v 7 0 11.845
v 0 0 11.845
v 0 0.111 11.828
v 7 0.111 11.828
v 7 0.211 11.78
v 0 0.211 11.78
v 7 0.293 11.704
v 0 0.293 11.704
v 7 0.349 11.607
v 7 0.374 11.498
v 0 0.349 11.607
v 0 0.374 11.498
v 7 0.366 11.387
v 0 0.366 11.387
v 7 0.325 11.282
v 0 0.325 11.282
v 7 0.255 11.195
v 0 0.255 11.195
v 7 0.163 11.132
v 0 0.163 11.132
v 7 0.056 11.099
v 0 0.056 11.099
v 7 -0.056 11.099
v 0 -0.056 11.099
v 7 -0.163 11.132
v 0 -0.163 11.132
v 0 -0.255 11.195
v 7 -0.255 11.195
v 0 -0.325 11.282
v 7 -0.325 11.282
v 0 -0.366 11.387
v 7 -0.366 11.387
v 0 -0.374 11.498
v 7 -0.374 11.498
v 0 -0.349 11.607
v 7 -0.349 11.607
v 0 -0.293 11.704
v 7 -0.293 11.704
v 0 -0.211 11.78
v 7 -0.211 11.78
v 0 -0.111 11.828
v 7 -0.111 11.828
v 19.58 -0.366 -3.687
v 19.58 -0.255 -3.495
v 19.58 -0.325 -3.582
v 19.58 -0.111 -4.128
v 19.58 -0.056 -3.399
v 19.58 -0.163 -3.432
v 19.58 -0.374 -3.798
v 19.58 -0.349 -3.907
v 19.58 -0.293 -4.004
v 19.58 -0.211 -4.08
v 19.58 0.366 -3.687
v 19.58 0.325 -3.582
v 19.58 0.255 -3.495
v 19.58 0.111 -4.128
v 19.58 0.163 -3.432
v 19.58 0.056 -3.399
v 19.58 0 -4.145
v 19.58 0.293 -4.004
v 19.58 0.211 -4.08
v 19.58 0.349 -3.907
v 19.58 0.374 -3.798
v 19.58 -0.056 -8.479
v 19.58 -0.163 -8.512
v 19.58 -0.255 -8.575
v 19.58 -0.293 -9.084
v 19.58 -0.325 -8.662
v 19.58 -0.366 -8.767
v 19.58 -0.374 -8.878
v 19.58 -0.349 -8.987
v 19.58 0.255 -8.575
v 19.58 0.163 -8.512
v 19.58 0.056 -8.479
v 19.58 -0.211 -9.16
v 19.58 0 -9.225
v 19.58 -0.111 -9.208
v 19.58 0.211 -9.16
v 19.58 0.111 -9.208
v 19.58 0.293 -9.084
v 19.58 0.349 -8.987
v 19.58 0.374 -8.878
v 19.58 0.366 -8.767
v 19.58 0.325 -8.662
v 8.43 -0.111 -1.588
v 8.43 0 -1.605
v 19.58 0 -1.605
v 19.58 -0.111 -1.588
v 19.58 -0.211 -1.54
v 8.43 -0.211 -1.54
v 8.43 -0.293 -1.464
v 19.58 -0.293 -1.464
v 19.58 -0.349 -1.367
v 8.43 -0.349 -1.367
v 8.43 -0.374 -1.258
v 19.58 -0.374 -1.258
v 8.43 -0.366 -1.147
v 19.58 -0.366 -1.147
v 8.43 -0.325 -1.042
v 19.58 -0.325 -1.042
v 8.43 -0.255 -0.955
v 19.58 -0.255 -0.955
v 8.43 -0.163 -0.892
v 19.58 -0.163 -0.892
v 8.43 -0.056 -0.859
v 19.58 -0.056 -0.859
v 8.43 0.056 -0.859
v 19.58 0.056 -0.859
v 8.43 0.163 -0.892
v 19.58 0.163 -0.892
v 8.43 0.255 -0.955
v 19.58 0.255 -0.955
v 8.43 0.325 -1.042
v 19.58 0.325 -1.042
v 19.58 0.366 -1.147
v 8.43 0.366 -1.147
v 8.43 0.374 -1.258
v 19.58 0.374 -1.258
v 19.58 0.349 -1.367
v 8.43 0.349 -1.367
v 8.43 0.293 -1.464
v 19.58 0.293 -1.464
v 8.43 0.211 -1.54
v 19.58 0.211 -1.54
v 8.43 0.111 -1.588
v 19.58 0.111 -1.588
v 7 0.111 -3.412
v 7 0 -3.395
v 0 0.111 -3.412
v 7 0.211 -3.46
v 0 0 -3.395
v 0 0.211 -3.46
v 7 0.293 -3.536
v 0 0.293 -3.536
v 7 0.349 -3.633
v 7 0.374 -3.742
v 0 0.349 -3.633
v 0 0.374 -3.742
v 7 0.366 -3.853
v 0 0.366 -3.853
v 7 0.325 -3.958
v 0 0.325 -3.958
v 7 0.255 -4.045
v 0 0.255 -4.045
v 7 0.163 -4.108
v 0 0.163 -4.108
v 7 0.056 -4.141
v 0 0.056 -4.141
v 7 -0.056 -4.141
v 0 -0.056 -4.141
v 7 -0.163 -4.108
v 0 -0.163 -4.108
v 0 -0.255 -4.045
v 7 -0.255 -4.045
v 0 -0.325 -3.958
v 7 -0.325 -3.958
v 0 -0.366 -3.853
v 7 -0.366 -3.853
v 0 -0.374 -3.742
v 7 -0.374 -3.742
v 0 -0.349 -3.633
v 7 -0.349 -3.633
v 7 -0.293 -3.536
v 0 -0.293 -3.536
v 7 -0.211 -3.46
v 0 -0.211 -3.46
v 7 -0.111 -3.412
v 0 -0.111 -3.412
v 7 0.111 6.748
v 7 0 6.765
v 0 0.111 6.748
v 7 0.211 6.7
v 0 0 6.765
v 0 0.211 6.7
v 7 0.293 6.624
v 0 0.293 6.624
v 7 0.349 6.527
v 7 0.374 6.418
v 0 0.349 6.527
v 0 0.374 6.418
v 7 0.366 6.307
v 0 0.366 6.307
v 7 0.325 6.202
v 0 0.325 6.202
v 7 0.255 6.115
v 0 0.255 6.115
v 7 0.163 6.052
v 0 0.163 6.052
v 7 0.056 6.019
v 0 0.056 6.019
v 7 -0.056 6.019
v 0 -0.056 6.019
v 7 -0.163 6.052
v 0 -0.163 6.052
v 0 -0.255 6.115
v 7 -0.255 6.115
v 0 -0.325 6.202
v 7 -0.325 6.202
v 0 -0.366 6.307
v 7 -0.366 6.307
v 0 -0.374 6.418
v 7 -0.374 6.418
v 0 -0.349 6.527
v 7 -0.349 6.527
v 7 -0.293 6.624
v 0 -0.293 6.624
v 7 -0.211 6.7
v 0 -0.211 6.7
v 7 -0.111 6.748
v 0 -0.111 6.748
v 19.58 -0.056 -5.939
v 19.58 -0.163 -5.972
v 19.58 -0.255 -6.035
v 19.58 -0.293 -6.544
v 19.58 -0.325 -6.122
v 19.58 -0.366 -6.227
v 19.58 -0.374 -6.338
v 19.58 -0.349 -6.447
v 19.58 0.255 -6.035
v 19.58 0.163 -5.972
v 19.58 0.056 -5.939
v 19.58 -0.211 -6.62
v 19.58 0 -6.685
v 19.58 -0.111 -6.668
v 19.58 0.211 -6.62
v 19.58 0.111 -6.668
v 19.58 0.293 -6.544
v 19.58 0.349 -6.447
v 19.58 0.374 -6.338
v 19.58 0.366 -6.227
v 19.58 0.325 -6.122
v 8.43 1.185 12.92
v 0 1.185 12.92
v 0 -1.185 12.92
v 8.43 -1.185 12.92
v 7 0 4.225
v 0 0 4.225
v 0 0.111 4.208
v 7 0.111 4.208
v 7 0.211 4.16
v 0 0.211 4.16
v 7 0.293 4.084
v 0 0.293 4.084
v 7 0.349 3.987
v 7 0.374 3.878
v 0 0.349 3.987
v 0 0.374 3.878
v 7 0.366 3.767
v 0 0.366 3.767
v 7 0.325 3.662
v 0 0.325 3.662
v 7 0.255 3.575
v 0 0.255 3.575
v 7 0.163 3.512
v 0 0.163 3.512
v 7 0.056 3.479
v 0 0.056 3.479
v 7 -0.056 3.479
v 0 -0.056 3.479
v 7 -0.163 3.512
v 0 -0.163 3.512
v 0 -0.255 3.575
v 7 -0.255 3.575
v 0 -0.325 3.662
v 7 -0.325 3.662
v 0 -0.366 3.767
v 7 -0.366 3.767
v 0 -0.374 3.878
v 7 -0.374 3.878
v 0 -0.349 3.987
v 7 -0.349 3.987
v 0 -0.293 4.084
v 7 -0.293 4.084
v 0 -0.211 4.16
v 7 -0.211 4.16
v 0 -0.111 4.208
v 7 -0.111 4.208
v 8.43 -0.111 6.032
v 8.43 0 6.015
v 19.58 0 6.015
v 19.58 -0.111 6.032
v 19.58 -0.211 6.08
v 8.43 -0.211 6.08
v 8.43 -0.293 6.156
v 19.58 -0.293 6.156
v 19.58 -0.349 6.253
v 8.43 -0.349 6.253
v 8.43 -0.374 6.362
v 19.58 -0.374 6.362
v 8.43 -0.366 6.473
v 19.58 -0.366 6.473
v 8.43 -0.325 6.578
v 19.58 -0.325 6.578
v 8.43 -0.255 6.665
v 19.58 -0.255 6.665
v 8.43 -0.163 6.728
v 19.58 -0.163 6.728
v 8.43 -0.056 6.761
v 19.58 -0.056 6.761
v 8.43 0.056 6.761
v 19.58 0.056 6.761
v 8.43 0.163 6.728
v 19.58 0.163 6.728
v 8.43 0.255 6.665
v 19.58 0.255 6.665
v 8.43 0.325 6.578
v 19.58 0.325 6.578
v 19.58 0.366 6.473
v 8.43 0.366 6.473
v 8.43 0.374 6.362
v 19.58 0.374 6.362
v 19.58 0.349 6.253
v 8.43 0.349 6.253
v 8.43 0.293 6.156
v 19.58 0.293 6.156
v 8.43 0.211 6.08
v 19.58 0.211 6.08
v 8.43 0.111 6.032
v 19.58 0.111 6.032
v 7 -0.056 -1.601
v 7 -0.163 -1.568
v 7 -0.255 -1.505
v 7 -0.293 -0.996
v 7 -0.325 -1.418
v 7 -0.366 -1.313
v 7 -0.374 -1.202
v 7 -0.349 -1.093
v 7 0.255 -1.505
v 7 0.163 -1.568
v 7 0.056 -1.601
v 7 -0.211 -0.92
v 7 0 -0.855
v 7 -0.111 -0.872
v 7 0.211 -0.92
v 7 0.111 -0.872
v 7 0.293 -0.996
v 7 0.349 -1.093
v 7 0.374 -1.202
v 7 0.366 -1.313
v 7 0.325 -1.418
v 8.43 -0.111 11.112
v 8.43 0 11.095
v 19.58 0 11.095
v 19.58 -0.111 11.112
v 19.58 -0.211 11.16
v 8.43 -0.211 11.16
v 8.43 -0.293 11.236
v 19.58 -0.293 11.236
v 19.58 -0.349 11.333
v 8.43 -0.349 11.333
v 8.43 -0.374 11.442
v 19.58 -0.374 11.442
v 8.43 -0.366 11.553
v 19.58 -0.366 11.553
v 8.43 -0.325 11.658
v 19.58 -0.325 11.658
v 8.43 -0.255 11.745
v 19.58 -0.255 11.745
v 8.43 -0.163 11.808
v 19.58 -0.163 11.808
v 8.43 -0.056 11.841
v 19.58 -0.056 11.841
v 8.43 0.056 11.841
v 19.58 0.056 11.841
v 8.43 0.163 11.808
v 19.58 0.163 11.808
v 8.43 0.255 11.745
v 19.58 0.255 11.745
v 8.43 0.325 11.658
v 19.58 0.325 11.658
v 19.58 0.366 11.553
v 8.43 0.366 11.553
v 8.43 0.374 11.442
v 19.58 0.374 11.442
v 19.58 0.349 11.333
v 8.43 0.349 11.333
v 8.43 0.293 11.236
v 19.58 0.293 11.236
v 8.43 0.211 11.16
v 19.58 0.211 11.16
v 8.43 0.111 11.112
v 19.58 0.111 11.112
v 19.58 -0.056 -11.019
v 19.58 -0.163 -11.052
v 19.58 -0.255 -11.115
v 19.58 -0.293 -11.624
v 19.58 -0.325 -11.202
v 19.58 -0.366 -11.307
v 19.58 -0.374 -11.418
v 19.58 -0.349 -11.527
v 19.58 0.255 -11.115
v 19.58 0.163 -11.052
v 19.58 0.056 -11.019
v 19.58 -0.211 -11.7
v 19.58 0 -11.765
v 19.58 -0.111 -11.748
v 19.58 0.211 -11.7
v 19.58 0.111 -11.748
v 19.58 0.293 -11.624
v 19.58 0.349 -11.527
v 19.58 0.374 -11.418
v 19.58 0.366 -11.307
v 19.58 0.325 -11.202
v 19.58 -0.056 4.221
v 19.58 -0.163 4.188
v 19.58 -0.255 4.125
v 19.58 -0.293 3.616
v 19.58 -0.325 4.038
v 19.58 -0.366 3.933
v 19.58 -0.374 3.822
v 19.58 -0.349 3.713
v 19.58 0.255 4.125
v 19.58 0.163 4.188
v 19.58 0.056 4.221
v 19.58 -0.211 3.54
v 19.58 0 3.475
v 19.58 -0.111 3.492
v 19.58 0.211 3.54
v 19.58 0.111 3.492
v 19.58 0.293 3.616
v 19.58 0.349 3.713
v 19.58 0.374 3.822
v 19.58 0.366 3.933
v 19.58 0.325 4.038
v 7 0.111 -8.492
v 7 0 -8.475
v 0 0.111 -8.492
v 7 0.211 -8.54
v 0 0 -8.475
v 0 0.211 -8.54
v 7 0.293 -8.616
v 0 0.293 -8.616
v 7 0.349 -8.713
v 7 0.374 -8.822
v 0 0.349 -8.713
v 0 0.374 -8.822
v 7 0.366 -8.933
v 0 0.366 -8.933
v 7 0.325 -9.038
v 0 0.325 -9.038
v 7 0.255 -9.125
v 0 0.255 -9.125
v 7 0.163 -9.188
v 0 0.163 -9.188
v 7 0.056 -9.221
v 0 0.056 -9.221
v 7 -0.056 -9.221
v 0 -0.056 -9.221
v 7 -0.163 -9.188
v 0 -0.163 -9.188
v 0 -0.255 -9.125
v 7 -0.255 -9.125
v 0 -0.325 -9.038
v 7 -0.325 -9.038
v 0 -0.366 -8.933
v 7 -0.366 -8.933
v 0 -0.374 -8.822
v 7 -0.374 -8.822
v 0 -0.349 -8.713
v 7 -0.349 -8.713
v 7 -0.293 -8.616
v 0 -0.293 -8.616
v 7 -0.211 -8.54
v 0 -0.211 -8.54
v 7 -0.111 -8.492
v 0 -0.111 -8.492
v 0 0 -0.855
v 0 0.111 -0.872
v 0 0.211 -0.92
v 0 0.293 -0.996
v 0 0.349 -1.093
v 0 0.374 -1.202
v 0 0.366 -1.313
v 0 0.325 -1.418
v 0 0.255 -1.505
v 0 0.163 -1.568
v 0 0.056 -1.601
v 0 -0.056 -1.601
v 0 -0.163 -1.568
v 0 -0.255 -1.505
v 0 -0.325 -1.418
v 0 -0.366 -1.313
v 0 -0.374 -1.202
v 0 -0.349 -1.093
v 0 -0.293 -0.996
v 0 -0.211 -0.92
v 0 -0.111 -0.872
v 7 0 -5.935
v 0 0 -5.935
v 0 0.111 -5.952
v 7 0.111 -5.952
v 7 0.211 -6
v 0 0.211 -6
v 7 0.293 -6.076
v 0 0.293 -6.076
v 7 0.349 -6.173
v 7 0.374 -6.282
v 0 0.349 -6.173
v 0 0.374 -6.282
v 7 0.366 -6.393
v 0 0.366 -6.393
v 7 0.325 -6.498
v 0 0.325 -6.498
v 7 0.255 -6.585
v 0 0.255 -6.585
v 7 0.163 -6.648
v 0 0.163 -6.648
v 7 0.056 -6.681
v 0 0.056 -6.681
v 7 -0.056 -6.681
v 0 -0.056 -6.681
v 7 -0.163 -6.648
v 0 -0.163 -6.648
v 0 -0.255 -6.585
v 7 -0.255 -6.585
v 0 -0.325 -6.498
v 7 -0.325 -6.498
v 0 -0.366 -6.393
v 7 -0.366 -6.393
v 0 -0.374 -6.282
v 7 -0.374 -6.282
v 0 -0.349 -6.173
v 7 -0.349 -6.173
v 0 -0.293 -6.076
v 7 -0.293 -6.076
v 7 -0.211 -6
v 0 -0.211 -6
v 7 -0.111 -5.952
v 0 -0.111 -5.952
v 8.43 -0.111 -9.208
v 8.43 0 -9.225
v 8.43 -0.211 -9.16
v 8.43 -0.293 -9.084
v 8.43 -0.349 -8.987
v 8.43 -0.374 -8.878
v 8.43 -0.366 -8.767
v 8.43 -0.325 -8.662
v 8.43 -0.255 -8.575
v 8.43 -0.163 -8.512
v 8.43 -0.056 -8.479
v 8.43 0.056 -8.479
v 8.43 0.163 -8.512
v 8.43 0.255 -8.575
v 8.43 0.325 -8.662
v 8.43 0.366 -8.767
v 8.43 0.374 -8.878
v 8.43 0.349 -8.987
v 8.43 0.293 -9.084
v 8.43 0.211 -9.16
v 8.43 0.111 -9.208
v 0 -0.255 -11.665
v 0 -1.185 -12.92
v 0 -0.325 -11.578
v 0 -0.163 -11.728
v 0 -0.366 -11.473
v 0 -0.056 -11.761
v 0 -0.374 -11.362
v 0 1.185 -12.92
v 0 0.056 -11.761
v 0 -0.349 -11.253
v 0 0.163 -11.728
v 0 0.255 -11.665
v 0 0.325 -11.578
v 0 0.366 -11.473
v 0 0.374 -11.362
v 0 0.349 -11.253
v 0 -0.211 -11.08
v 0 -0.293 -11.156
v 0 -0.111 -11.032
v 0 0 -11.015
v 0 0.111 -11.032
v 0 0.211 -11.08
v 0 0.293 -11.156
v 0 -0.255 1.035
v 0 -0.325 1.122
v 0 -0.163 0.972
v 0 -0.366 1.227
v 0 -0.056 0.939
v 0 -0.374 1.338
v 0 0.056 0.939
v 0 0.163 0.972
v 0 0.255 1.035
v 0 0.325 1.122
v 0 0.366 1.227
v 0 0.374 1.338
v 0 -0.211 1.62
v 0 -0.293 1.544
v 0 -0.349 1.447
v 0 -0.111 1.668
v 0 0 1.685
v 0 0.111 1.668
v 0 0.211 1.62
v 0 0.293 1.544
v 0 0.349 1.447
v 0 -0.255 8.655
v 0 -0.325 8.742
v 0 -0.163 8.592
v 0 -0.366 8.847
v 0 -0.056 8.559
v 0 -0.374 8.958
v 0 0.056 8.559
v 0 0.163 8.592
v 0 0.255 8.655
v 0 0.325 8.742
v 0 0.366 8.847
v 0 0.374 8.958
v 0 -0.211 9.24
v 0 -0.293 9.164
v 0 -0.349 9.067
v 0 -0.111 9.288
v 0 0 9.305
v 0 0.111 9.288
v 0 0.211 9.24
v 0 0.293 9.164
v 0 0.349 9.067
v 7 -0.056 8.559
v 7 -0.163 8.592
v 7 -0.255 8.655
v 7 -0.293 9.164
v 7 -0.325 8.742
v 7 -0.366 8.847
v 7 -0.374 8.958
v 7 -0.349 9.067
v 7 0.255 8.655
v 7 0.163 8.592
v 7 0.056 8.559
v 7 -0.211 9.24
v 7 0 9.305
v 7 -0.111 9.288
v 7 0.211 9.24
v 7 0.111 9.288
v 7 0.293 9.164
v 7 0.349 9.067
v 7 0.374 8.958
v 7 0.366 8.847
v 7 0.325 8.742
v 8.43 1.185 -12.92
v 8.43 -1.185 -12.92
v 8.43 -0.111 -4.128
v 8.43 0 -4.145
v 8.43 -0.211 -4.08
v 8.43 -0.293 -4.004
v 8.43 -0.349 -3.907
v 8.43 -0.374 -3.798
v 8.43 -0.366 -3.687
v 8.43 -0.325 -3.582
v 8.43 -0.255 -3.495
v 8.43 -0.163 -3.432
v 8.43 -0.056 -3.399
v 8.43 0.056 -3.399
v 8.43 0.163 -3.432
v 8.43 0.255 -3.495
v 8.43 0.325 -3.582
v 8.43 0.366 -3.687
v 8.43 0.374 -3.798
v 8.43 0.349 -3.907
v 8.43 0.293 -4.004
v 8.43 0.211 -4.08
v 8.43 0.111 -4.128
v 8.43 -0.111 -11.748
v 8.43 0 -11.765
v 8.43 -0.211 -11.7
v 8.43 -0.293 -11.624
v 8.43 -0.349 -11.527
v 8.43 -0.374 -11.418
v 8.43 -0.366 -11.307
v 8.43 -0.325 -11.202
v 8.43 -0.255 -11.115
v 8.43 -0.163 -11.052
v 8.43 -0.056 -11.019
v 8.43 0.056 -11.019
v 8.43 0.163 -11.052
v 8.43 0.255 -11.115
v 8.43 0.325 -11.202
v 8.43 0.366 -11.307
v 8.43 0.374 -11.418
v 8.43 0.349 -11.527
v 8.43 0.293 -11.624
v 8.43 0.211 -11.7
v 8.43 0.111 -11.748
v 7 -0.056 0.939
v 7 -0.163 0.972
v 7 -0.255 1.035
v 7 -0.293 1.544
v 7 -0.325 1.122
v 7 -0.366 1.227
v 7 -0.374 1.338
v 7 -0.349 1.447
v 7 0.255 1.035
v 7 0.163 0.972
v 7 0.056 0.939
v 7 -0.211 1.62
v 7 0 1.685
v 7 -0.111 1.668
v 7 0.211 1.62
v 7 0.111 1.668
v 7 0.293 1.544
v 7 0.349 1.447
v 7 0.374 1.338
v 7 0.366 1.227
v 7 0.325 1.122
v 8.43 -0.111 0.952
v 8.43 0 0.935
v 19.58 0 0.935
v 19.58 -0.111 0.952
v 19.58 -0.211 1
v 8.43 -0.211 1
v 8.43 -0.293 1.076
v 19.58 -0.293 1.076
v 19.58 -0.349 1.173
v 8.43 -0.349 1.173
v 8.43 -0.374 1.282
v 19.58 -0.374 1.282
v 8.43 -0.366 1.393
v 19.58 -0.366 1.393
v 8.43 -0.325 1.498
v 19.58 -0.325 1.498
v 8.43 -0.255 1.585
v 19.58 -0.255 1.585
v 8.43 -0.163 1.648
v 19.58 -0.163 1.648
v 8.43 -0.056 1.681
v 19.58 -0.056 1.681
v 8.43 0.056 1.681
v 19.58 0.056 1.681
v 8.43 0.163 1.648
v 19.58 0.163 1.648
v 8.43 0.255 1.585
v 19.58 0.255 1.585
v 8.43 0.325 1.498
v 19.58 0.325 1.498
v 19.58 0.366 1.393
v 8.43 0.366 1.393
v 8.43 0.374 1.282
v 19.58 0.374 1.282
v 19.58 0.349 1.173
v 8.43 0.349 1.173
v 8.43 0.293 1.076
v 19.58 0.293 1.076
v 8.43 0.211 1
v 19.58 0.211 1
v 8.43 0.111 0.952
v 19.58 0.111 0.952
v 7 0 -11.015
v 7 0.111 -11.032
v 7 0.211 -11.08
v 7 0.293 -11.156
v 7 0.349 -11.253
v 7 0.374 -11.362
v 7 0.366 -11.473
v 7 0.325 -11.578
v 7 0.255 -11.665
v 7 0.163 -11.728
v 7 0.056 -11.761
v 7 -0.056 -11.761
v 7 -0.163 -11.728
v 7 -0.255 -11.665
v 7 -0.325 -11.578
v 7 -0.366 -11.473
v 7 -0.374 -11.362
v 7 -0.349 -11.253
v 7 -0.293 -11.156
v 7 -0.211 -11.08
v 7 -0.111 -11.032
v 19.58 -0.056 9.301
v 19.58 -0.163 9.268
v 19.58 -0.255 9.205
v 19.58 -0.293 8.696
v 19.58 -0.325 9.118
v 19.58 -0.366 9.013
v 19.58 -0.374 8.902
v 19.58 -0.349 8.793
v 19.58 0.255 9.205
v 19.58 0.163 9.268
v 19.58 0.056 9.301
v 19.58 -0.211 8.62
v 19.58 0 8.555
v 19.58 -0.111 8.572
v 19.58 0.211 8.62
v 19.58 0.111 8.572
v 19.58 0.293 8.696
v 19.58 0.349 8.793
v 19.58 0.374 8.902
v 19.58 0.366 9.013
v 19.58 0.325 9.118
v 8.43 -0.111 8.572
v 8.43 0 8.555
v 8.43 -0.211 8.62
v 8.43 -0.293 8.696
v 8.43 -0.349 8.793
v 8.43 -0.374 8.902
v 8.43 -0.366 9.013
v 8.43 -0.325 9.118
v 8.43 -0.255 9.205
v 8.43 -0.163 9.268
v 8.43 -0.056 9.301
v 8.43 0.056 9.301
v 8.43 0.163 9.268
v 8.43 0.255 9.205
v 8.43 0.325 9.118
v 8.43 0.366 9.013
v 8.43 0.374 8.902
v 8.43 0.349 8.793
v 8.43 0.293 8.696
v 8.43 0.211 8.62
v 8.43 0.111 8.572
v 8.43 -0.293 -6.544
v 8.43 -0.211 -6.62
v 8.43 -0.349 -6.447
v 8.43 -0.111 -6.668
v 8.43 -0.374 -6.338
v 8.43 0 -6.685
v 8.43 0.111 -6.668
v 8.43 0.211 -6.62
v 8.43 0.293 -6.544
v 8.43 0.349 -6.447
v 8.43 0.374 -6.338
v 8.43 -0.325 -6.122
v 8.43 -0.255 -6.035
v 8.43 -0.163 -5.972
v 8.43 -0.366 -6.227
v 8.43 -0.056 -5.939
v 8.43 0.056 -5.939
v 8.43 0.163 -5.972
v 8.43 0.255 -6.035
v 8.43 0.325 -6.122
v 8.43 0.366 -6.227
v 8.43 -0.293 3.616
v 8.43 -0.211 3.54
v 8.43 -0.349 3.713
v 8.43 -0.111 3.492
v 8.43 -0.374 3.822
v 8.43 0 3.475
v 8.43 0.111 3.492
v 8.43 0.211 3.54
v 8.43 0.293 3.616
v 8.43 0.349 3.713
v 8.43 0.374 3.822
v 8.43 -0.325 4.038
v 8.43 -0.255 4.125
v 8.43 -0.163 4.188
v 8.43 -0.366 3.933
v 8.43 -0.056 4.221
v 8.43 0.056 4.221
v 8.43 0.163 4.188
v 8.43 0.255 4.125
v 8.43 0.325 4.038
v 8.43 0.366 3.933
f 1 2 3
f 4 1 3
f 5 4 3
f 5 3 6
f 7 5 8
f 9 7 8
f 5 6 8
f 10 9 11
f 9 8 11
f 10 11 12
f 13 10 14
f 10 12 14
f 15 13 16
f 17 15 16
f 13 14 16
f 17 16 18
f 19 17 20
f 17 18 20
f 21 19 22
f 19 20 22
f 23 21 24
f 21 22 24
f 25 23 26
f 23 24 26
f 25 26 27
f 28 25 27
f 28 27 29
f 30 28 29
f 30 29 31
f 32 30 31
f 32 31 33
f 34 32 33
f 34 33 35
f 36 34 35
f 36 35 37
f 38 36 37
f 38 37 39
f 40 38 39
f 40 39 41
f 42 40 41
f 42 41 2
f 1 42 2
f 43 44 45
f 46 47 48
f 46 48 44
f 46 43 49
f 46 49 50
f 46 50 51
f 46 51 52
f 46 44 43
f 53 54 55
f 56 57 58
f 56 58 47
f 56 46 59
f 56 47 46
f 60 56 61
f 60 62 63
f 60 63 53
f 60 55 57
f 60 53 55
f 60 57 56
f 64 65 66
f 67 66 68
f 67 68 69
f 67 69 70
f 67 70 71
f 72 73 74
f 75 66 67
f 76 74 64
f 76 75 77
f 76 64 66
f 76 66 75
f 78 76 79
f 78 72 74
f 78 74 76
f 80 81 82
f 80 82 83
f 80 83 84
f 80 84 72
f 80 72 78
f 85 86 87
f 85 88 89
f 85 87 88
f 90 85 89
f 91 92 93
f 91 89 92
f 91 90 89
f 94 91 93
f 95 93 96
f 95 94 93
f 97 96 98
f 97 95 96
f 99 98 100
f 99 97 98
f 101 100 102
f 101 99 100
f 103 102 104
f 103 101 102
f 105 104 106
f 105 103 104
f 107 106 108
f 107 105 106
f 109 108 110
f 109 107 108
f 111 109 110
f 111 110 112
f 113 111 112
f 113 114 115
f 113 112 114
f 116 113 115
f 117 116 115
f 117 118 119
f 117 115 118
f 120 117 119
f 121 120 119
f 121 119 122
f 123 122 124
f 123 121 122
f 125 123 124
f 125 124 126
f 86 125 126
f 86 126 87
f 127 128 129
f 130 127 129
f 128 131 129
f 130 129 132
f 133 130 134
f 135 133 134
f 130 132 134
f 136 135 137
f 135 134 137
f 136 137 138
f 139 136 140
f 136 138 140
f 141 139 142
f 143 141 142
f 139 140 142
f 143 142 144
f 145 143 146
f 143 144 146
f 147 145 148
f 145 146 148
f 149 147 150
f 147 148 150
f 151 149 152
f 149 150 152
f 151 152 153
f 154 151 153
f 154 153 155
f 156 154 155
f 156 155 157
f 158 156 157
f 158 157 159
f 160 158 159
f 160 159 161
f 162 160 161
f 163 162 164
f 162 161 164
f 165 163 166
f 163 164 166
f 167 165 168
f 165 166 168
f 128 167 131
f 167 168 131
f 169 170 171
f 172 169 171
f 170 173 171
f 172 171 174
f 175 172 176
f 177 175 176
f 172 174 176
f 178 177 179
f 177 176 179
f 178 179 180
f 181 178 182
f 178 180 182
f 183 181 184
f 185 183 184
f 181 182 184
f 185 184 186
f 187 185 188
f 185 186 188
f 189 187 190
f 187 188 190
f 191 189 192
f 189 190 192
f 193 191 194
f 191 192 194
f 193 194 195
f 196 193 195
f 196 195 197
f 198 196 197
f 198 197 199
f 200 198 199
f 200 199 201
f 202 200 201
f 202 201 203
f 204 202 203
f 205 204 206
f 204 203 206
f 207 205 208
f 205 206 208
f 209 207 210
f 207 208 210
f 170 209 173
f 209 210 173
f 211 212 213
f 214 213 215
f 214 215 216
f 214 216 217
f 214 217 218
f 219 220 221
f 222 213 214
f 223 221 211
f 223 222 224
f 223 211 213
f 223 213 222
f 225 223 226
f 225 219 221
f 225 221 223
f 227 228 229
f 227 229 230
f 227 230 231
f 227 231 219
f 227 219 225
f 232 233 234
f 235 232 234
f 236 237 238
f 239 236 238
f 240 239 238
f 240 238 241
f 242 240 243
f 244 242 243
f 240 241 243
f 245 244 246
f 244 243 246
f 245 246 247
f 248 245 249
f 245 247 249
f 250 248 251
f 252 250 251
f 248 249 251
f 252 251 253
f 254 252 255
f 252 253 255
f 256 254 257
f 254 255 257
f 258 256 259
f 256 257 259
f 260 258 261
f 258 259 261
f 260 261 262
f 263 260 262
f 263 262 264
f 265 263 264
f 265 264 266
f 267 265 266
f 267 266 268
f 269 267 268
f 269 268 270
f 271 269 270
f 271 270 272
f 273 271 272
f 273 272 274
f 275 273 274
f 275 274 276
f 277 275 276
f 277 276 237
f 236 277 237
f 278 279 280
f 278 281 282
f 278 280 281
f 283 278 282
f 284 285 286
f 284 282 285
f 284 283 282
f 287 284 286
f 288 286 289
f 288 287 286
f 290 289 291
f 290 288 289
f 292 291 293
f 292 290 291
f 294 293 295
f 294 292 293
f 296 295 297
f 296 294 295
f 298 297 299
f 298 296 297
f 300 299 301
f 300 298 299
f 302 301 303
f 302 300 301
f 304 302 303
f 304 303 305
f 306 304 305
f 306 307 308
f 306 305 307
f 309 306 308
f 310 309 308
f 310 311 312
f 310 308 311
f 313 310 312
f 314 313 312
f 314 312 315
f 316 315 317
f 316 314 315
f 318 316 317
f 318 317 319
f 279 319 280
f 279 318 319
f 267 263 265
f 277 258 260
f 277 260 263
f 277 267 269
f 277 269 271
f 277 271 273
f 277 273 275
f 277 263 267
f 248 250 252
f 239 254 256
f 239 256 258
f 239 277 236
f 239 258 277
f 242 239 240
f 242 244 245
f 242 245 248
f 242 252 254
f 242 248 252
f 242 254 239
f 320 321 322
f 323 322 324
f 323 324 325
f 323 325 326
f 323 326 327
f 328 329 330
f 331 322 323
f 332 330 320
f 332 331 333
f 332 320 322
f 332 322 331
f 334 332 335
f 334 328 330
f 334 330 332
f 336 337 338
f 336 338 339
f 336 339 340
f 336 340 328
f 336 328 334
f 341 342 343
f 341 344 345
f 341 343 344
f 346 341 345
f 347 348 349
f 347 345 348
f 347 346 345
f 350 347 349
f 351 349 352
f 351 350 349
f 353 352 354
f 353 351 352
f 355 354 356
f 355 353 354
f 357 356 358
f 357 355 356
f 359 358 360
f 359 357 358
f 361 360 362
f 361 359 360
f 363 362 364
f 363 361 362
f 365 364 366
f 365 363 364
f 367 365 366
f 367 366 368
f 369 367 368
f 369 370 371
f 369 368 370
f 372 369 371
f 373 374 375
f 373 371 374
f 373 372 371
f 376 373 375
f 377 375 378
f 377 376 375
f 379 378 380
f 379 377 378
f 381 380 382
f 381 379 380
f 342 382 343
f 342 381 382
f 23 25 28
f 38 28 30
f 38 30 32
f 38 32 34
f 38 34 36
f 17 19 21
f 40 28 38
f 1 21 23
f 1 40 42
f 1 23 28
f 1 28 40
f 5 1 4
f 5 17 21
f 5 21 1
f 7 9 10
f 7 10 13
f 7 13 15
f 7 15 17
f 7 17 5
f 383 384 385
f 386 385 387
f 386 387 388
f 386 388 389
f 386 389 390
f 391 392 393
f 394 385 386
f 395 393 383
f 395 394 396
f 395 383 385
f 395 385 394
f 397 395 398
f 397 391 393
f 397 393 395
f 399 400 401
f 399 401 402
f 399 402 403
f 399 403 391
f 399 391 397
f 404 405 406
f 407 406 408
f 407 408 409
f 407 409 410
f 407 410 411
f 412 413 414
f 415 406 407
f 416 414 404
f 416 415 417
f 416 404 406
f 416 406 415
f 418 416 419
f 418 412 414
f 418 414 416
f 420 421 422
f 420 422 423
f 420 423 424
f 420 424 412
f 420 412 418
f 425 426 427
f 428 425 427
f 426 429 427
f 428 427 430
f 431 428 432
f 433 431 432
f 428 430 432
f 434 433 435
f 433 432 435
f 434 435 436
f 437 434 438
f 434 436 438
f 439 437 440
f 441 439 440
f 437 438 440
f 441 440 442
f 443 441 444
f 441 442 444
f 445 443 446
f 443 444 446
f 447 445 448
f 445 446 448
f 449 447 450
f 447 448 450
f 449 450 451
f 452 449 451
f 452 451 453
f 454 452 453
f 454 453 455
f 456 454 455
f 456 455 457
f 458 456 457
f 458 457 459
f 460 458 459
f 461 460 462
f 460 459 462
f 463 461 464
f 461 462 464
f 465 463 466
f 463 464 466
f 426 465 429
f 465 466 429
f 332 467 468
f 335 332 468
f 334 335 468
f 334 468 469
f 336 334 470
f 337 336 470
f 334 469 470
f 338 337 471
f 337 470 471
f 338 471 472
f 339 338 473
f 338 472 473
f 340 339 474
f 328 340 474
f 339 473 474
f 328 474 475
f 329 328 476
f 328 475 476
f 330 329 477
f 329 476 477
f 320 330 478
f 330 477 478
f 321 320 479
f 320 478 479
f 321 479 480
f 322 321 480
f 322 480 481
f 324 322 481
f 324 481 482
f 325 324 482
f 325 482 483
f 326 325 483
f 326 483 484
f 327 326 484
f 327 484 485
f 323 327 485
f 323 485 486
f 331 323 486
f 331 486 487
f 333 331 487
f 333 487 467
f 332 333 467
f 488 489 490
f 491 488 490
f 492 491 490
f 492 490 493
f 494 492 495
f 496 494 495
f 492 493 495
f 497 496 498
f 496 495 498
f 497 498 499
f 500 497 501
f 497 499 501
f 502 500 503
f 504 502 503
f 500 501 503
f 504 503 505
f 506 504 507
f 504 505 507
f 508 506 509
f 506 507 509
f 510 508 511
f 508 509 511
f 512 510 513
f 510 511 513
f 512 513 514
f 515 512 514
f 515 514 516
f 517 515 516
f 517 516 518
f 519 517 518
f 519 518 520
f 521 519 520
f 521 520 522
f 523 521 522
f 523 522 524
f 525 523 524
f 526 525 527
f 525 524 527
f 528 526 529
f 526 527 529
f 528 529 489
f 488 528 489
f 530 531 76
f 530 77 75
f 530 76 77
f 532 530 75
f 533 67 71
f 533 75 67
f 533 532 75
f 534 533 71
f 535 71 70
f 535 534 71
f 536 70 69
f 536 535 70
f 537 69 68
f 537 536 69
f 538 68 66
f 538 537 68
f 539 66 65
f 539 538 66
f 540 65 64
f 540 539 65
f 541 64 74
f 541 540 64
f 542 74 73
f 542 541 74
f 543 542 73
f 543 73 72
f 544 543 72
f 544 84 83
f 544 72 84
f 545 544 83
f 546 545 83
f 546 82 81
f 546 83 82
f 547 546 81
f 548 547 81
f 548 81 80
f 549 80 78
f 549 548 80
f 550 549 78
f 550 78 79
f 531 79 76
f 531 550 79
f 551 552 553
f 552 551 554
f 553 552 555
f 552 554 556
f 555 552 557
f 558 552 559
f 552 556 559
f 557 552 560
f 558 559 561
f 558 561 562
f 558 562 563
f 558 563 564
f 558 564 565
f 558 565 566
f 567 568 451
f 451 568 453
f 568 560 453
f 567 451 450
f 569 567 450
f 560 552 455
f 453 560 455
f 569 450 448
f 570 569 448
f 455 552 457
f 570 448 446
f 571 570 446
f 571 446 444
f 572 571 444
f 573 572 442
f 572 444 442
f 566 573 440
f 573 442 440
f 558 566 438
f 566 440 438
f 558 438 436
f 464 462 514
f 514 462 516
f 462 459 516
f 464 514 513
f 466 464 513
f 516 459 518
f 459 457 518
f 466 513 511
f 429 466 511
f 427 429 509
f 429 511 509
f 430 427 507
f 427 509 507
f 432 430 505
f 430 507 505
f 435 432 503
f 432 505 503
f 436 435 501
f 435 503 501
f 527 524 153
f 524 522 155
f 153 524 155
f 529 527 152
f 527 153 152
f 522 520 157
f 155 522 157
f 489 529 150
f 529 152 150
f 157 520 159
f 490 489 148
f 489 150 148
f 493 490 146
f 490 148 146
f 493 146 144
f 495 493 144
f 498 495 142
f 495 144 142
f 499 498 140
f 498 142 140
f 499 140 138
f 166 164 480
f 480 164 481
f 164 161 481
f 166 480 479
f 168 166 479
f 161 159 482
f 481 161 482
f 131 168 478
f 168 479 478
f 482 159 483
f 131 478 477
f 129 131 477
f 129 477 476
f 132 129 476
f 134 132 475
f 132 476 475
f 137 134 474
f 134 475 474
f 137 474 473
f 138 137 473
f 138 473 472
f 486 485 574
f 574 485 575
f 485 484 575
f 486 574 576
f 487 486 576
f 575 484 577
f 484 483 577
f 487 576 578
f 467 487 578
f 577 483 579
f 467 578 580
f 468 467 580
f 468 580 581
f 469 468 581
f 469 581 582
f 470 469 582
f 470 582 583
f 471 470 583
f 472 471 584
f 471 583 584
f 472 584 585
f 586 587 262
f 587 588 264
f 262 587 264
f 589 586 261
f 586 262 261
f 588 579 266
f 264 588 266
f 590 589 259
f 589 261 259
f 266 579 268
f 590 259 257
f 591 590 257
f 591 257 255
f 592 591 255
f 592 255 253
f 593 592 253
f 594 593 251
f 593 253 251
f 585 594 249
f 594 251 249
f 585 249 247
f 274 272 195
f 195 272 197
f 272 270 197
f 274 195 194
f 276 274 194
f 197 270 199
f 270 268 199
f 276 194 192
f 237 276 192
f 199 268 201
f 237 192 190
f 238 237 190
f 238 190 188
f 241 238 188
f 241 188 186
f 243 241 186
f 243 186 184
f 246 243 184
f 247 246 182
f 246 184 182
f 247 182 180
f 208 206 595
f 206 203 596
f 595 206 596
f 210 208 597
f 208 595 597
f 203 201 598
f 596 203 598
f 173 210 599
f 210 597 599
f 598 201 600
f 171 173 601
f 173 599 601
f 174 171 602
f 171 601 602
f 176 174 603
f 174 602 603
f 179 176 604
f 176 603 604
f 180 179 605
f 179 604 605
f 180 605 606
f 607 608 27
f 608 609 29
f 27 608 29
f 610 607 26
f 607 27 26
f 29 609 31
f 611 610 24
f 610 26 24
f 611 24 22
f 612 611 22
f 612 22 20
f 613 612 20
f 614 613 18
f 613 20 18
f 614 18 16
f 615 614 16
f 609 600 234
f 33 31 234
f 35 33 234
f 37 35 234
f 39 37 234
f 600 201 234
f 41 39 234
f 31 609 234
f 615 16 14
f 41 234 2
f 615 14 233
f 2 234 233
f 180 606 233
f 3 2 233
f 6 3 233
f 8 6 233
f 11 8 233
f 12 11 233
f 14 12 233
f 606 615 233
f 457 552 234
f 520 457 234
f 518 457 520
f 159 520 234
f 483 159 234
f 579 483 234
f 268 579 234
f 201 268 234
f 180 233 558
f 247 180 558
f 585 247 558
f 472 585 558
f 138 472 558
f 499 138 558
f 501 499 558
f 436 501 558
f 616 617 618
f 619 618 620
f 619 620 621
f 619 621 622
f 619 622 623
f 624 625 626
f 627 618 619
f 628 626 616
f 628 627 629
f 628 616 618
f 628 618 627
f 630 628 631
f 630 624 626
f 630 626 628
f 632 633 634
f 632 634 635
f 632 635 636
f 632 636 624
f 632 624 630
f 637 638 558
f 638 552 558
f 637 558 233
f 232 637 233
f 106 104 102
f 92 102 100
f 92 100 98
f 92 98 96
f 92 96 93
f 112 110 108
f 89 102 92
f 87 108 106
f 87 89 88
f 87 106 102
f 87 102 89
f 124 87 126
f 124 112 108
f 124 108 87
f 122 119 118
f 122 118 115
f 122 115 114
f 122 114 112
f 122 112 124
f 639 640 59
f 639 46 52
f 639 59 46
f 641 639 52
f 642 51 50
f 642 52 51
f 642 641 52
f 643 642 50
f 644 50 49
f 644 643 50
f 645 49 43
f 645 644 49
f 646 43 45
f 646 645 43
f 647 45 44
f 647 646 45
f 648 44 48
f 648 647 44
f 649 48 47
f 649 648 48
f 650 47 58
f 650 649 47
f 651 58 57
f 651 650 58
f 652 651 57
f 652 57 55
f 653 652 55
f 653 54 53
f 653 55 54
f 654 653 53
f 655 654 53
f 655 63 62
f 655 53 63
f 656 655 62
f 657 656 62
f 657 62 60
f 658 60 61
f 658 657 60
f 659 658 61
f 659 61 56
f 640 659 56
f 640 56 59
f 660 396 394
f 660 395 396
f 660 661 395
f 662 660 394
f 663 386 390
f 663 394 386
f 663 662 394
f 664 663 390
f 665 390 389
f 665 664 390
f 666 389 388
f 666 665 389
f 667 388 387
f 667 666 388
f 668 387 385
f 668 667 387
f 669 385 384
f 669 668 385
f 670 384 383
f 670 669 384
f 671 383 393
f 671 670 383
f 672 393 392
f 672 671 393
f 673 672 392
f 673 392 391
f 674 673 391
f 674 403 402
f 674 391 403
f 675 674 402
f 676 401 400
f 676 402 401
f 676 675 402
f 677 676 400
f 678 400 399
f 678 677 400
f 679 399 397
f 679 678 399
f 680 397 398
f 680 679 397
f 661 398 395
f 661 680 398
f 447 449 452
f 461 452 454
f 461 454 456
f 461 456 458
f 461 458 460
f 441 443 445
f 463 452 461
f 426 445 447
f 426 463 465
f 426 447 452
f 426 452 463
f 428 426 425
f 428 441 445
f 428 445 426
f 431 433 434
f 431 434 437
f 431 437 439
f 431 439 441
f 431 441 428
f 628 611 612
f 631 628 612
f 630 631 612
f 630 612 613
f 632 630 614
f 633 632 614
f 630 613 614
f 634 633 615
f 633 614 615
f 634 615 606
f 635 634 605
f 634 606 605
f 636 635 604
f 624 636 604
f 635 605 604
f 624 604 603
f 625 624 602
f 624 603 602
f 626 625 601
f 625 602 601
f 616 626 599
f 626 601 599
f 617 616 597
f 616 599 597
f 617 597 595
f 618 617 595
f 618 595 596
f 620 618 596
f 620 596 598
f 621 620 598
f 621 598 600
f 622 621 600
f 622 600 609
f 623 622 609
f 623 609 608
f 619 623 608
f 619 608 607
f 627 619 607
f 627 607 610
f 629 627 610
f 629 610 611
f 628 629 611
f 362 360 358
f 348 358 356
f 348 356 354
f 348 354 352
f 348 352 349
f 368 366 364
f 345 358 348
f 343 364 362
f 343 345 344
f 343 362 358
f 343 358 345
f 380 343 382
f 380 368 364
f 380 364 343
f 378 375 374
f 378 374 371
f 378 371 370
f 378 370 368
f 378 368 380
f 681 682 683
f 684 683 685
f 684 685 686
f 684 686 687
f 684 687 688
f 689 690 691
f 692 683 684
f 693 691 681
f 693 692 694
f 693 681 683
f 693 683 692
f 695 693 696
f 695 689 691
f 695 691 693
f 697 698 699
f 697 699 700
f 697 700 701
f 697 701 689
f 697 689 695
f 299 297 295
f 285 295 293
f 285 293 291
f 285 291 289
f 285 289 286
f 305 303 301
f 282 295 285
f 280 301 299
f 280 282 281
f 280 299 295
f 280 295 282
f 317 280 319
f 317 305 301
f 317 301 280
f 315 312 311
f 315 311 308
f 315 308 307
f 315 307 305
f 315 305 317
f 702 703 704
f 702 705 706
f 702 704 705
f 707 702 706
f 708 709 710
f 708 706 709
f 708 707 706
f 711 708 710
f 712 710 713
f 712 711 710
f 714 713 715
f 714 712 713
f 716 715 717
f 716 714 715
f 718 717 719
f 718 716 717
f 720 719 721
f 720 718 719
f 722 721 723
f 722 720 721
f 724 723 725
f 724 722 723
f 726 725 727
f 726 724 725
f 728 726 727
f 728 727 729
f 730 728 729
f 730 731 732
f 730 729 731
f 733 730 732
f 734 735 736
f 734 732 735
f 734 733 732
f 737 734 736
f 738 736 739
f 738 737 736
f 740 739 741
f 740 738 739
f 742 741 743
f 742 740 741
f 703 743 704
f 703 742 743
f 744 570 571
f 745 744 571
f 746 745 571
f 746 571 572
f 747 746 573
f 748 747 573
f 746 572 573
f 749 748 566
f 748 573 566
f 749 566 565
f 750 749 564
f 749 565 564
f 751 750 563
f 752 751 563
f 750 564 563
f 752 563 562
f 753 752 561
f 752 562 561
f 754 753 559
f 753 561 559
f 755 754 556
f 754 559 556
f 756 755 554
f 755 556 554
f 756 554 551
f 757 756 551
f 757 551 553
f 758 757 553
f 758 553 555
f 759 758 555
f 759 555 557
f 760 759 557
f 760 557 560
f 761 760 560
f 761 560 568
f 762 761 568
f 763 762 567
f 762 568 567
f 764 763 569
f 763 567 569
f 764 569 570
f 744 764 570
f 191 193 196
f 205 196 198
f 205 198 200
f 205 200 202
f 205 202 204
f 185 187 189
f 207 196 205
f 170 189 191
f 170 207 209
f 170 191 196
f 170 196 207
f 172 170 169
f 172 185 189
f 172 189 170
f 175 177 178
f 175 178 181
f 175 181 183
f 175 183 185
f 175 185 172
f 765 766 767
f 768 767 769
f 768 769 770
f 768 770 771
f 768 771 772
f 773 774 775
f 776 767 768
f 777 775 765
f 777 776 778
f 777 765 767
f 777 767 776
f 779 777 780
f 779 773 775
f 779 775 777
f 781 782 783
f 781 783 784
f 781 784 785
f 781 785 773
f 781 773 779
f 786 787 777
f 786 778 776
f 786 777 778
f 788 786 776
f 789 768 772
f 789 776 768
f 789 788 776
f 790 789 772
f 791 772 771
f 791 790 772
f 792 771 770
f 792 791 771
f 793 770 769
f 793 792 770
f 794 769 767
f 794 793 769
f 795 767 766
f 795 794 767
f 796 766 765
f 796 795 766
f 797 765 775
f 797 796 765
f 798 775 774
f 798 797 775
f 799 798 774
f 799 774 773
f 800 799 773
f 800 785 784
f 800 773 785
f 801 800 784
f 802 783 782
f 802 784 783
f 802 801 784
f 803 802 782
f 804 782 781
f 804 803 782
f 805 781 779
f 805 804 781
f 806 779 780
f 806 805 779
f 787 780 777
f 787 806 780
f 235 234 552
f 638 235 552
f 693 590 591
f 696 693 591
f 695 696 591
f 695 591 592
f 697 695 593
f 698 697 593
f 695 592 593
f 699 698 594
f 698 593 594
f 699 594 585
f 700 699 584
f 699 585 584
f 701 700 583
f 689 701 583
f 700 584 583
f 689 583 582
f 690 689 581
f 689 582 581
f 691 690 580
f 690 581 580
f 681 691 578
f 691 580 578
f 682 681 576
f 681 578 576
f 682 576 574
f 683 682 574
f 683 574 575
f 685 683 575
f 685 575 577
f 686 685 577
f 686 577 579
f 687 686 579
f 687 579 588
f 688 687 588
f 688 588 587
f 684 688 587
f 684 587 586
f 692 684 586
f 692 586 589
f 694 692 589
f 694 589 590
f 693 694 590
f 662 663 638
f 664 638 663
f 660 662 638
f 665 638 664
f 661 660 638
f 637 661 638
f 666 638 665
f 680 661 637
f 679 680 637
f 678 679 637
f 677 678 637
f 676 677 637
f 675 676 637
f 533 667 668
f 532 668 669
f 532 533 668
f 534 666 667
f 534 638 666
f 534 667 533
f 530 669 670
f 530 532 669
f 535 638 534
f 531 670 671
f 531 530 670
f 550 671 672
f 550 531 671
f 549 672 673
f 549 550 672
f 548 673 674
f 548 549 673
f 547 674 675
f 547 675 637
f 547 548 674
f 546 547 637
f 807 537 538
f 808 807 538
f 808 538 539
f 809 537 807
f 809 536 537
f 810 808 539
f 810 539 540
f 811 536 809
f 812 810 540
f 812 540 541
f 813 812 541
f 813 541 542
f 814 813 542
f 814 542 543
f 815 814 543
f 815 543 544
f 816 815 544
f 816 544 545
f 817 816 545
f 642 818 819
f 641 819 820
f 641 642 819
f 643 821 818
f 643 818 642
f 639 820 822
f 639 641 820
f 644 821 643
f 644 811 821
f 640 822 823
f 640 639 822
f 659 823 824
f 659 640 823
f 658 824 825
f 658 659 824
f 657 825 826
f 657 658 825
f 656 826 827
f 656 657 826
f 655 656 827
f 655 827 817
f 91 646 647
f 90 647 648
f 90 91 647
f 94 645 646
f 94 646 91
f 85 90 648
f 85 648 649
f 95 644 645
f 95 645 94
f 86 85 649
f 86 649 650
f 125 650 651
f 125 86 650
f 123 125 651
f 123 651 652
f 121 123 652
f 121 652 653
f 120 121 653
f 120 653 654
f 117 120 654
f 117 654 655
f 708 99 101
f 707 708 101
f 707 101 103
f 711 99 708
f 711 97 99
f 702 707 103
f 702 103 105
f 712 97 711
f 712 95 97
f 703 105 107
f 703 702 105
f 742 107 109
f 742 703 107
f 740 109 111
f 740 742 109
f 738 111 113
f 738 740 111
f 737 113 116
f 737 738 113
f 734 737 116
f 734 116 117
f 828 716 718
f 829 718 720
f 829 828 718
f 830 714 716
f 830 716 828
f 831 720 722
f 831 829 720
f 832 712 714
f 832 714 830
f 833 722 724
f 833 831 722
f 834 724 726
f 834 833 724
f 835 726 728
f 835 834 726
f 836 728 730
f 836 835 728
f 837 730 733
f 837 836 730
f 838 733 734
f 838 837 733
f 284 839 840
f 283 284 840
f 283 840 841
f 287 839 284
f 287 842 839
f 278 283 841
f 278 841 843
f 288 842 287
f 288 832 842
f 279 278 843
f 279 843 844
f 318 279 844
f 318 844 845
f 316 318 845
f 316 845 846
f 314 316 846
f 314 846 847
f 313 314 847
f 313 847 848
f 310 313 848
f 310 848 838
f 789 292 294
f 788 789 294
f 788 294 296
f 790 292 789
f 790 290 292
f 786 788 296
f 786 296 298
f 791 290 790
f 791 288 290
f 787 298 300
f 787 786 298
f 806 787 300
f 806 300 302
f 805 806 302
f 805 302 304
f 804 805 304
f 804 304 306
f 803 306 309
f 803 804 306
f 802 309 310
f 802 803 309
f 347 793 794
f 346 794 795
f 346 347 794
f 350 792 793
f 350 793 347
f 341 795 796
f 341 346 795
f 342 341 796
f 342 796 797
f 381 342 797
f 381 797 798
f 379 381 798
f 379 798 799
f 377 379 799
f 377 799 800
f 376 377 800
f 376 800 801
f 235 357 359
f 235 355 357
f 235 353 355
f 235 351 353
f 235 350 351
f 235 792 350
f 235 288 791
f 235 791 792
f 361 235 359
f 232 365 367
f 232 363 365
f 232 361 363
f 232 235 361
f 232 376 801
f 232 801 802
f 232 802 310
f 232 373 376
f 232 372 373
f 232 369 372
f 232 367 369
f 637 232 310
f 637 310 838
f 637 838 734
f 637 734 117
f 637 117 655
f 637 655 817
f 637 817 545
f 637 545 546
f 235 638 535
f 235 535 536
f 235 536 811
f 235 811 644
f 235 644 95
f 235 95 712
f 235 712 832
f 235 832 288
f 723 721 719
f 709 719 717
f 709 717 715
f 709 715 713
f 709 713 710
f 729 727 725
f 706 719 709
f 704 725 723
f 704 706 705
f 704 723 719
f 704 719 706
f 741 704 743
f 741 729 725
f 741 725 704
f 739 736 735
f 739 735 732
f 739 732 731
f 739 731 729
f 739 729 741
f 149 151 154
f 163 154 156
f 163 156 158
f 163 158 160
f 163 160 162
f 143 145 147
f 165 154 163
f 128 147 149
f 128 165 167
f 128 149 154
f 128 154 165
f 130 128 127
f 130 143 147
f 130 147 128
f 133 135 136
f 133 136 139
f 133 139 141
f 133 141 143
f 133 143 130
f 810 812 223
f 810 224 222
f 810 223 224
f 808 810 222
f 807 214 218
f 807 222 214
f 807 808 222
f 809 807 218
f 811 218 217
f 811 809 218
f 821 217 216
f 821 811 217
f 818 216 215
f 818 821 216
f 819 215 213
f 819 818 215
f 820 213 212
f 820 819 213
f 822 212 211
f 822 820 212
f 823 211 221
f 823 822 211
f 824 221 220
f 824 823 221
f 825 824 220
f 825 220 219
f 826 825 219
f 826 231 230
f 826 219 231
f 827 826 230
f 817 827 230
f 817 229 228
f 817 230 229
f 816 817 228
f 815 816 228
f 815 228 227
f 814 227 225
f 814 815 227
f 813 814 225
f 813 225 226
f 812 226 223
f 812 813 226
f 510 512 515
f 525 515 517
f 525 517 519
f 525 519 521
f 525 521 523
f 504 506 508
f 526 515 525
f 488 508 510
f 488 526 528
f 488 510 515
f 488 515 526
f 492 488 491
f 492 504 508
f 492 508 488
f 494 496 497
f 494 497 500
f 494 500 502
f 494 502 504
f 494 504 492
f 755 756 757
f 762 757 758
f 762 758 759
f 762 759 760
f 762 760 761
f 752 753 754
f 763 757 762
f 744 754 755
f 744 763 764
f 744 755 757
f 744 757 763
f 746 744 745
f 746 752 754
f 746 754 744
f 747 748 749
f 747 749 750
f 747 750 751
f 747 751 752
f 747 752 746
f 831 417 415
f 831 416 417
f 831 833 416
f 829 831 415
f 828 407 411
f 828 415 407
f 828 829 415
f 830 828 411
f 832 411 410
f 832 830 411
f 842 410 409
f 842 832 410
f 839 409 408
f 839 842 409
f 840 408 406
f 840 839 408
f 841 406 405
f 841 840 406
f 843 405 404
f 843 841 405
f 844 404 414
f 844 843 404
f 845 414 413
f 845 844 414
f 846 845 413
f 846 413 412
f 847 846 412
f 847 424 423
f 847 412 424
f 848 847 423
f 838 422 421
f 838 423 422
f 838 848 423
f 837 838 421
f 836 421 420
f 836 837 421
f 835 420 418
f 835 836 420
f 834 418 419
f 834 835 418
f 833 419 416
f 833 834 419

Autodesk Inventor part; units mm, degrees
ref_plane "YZ Plane" through (0, 0, 0) normal (1, 0, 0) x (0, 1, 0)
ref_plane "XZ Plane" through (0, 0, 0) normal (0, 1, 0) x (-1, 0, 0)
ref_plane "XY Plane" through (0, 0, 0) normal (0, 0, 1) x (1, 0, 0)
sketch "Sketch1" plane through (0, 0, 0) normal (1, 0, 0) x (0, 1, 0)
  line L0 (-1.185, -12.92) -> (1.185, -12.92)
  line L1 (1.185, -12.92) -> (1.185, 12.92)
  line L2 (1.185, 12.92) -> (-1.185, 12.92)
  line L3 (-1.185, 12.92) -> (-1.185, -12.92)
  line L4 (-1.185, -12.92) -> (1.185, 12.92) construction
  line L5 (1.185, -12.92) -> (-1.185, 12.92) construction
  point P0 (0, 0)
  dimension "d0" = 2.37
  dimension "d1" = 25.84
extrude "Extrusion1" add sketch "Sketch1" along normal blind 8.43
sketch "Sketch2" plane through (8.43, 0, 0) normal (1, 0, 0) x (0, 0, -1)
  line L0 (12.92, -1.185) -> (12.92, 1.185) projected
  line L1 (12.92, 1.185) -> (-12.92, 1.185) projected
  line L2 (-12.92, 1.185) -> (-12.92, -1.185) projected
  line L3 (-12.92, -1.185) -> (12.92, -1.185) projected
  circle A0 centre (-11.47, 0) radius 0.375
  point P0 (0, 0)
  dimension "d4" = 0.75
  dimension "d5" = 1.45
extrude "Extrusion2" add sketch "Sketch2" along normal blind 11.15 contours A0
sketch "Sketch3" plane through (0, 0, 0) normal (-1, 0, 0) x (0, 0, 1)
  circle A0 centre (11.47, 0) radius 0.375 projected
  point P0 (0, 0)
extrude "Extrusion3" cut sketch "Sketch3" against normal blind 7
pattern_linear "Rectangular Pattern1" count 10 spacing 2.54 along (0, 0, -1) of "Extrusion2", "Extrusion3"
ref_plane "Work Plane1" through (0, -1.185, 0) normal (0, 0, 1) x (1, 0, 0)
ref_plane "Work Plane3" through (0, 0, 12.92) normal (0, 1, 0) x (1, 0, 0)
properties part number "00_electricpin_2.54_10x"
